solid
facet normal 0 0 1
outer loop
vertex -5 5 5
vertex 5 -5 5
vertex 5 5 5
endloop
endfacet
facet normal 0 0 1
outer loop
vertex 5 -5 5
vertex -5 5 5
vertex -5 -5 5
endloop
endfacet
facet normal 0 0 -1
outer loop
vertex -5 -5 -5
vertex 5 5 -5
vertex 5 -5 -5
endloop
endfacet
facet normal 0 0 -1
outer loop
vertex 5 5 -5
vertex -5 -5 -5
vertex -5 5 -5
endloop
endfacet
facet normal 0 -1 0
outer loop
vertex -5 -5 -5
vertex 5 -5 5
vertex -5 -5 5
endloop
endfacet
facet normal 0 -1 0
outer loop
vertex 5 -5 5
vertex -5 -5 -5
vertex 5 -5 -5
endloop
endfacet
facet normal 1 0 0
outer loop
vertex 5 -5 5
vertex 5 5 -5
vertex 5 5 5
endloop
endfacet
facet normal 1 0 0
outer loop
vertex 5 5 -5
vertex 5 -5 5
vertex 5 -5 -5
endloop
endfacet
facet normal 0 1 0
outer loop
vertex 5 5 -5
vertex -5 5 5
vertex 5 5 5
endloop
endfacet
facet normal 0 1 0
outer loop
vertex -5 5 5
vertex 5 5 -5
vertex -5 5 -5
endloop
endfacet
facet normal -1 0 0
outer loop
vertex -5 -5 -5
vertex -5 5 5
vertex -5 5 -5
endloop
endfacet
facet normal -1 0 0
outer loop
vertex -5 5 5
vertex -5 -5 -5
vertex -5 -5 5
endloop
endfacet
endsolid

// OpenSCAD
// Simple valid cube
echo("Rendering good_cube.scad");
cube(size = [10, 10, 10], center = true); 
